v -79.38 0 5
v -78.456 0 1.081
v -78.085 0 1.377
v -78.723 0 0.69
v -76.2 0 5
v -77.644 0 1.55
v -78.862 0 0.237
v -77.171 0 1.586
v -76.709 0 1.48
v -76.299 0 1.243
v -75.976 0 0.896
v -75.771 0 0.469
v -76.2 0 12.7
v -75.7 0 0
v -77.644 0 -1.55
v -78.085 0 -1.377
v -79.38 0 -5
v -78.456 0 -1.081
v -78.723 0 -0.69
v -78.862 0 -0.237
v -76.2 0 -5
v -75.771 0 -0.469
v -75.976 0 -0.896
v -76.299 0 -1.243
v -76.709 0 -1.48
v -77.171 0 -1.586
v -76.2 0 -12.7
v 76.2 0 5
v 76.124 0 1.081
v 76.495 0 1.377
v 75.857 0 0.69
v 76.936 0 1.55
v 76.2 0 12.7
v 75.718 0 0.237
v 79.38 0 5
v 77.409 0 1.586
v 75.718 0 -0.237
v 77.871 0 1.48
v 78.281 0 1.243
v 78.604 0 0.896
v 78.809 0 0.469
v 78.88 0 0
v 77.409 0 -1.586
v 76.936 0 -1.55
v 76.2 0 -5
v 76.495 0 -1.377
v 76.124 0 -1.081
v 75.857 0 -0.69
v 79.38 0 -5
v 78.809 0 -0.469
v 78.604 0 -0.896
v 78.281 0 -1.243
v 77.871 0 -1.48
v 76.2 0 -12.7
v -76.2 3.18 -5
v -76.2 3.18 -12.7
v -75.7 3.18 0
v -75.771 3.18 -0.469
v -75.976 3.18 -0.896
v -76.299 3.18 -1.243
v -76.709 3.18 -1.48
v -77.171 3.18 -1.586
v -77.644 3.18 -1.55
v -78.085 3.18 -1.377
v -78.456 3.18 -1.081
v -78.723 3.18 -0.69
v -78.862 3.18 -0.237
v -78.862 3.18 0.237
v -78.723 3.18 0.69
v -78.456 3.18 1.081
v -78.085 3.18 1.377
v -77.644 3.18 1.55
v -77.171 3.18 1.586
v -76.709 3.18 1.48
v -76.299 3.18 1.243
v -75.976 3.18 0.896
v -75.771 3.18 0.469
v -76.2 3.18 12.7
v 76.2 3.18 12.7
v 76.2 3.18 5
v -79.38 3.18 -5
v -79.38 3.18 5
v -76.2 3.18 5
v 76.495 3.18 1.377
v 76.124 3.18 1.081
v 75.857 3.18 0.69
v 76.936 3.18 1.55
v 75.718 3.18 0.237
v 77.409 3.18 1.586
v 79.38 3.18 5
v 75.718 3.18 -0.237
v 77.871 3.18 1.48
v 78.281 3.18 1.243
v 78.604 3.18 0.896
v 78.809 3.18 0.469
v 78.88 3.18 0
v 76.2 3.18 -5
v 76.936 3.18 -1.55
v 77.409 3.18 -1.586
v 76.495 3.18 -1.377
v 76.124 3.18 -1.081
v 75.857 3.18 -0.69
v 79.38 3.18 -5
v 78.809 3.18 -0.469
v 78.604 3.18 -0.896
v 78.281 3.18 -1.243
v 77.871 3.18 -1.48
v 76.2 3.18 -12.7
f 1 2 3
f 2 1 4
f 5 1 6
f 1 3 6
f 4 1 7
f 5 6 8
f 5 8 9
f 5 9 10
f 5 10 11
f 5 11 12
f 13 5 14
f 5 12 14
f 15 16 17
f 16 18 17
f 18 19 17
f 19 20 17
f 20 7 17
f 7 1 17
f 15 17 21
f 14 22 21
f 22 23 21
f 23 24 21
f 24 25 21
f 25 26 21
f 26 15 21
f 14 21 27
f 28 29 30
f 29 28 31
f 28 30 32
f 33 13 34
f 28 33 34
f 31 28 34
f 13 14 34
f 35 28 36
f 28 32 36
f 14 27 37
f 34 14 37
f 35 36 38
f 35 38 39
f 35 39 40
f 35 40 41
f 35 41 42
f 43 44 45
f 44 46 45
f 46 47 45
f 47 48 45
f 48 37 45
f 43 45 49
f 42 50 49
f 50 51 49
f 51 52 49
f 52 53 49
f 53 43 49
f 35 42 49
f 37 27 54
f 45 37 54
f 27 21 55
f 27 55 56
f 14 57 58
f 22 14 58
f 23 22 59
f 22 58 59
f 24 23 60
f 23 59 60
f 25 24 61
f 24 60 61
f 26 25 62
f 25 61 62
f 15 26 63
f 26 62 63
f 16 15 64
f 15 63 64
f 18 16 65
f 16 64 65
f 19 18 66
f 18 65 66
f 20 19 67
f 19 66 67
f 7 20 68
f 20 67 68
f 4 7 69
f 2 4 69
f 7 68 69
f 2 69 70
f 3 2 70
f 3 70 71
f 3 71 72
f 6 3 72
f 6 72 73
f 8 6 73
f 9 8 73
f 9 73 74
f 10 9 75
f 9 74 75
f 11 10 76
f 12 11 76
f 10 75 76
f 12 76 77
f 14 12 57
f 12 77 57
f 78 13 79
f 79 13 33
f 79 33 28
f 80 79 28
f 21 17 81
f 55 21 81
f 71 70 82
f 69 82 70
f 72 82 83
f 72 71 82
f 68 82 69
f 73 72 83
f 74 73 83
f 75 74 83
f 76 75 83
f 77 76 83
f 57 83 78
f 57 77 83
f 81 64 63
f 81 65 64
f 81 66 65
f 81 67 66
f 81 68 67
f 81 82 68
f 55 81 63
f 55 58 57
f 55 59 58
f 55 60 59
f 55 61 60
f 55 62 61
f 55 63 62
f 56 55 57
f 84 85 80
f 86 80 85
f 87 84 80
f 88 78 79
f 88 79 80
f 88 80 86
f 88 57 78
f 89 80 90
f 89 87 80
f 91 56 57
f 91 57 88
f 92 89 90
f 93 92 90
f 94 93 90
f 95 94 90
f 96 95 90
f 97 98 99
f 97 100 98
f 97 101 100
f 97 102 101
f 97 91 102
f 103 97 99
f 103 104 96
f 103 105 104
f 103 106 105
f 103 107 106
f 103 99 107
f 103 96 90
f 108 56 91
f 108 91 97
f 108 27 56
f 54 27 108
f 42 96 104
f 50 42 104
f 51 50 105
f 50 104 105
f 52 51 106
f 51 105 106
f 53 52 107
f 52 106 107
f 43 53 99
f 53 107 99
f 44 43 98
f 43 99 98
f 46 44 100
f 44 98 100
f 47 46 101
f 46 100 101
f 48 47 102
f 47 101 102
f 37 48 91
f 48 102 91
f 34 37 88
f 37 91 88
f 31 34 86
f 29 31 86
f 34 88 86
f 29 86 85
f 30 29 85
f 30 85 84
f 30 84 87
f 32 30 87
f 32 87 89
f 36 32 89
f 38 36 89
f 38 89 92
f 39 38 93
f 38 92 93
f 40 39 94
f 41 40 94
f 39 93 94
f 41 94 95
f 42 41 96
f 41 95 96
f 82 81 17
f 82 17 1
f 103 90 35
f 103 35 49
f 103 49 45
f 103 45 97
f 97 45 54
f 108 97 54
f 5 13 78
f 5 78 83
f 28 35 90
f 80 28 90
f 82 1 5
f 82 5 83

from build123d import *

# Parameters (mm, degrees)
SKETCH2_W           = 152.4
SKETCH2_H           = 25.4
BOSS_EXTRUDE1_DEPTH = 3.18
SKETCH3_W           = 10
SKETCH3_H           = 3.18
BOSS_EXTRUDE2_DEPTH = 3.18
SKETCH4_W           = 10
SKETCH4_H           = 3.18
BOSS_EXTRUDE3_DEPTH = 3.18
SKETCH5_R           = 1.59
CUT_EXTRUDE1_DEPTH  = 3.18


with BuildPart() as part:
    # Sketch2 → Boss-Extrude1 (new body)
    with BuildSketch(Plane(origin=(0, 0, 0), x_dir=(1, 0, 0), z_dir=(0, 1, 0))):
        Rectangle(SKETCH2_W, SKETCH2_H)
    extrude(amount=BOSS_EXTRUDE1_DEPTH)

    # Sketch3 → Boss-Extrude2 (add)
    with BuildSketch(Plane.ZY.offset(76.2)):
        with Locations((0, 1.59)):
            Rectangle(SKETCH3_W, SKETCH3_H)
    extrude(amount=BOSS_EXTRUDE2_DEPTH)

    # Sketch4 → Boss-Extrude3 (add)
    with BuildSketch(Plane(origin=(76.2, 0, 0), x_dir=(0, 0, -1), z_dir=(1, 0, 0))):
        with Locations((0, 1.59)):
            Rectangle(SKETCH4_W, SKETCH4_H)
    extrude(amount=BOSS_EXTRUDE3_DEPTH)

    # Sketch5 → Cut-Extrude1 (cut)
    with BuildSketch(Plane(origin=(0, 3.18, 0), x_dir=(1, 0, 0), z_dir=(0, 1, 0))):
        with Locations((77.29, 0)):
            Circle(SKETCH5_R)
        with Locations((-77.29, 0)):
            Circle(SKETCH5_R)
    extrude(amount=-CUT_EXTRUDE1_DEPTH, mode=Mode.SUBTRACT)


solid = part.part
